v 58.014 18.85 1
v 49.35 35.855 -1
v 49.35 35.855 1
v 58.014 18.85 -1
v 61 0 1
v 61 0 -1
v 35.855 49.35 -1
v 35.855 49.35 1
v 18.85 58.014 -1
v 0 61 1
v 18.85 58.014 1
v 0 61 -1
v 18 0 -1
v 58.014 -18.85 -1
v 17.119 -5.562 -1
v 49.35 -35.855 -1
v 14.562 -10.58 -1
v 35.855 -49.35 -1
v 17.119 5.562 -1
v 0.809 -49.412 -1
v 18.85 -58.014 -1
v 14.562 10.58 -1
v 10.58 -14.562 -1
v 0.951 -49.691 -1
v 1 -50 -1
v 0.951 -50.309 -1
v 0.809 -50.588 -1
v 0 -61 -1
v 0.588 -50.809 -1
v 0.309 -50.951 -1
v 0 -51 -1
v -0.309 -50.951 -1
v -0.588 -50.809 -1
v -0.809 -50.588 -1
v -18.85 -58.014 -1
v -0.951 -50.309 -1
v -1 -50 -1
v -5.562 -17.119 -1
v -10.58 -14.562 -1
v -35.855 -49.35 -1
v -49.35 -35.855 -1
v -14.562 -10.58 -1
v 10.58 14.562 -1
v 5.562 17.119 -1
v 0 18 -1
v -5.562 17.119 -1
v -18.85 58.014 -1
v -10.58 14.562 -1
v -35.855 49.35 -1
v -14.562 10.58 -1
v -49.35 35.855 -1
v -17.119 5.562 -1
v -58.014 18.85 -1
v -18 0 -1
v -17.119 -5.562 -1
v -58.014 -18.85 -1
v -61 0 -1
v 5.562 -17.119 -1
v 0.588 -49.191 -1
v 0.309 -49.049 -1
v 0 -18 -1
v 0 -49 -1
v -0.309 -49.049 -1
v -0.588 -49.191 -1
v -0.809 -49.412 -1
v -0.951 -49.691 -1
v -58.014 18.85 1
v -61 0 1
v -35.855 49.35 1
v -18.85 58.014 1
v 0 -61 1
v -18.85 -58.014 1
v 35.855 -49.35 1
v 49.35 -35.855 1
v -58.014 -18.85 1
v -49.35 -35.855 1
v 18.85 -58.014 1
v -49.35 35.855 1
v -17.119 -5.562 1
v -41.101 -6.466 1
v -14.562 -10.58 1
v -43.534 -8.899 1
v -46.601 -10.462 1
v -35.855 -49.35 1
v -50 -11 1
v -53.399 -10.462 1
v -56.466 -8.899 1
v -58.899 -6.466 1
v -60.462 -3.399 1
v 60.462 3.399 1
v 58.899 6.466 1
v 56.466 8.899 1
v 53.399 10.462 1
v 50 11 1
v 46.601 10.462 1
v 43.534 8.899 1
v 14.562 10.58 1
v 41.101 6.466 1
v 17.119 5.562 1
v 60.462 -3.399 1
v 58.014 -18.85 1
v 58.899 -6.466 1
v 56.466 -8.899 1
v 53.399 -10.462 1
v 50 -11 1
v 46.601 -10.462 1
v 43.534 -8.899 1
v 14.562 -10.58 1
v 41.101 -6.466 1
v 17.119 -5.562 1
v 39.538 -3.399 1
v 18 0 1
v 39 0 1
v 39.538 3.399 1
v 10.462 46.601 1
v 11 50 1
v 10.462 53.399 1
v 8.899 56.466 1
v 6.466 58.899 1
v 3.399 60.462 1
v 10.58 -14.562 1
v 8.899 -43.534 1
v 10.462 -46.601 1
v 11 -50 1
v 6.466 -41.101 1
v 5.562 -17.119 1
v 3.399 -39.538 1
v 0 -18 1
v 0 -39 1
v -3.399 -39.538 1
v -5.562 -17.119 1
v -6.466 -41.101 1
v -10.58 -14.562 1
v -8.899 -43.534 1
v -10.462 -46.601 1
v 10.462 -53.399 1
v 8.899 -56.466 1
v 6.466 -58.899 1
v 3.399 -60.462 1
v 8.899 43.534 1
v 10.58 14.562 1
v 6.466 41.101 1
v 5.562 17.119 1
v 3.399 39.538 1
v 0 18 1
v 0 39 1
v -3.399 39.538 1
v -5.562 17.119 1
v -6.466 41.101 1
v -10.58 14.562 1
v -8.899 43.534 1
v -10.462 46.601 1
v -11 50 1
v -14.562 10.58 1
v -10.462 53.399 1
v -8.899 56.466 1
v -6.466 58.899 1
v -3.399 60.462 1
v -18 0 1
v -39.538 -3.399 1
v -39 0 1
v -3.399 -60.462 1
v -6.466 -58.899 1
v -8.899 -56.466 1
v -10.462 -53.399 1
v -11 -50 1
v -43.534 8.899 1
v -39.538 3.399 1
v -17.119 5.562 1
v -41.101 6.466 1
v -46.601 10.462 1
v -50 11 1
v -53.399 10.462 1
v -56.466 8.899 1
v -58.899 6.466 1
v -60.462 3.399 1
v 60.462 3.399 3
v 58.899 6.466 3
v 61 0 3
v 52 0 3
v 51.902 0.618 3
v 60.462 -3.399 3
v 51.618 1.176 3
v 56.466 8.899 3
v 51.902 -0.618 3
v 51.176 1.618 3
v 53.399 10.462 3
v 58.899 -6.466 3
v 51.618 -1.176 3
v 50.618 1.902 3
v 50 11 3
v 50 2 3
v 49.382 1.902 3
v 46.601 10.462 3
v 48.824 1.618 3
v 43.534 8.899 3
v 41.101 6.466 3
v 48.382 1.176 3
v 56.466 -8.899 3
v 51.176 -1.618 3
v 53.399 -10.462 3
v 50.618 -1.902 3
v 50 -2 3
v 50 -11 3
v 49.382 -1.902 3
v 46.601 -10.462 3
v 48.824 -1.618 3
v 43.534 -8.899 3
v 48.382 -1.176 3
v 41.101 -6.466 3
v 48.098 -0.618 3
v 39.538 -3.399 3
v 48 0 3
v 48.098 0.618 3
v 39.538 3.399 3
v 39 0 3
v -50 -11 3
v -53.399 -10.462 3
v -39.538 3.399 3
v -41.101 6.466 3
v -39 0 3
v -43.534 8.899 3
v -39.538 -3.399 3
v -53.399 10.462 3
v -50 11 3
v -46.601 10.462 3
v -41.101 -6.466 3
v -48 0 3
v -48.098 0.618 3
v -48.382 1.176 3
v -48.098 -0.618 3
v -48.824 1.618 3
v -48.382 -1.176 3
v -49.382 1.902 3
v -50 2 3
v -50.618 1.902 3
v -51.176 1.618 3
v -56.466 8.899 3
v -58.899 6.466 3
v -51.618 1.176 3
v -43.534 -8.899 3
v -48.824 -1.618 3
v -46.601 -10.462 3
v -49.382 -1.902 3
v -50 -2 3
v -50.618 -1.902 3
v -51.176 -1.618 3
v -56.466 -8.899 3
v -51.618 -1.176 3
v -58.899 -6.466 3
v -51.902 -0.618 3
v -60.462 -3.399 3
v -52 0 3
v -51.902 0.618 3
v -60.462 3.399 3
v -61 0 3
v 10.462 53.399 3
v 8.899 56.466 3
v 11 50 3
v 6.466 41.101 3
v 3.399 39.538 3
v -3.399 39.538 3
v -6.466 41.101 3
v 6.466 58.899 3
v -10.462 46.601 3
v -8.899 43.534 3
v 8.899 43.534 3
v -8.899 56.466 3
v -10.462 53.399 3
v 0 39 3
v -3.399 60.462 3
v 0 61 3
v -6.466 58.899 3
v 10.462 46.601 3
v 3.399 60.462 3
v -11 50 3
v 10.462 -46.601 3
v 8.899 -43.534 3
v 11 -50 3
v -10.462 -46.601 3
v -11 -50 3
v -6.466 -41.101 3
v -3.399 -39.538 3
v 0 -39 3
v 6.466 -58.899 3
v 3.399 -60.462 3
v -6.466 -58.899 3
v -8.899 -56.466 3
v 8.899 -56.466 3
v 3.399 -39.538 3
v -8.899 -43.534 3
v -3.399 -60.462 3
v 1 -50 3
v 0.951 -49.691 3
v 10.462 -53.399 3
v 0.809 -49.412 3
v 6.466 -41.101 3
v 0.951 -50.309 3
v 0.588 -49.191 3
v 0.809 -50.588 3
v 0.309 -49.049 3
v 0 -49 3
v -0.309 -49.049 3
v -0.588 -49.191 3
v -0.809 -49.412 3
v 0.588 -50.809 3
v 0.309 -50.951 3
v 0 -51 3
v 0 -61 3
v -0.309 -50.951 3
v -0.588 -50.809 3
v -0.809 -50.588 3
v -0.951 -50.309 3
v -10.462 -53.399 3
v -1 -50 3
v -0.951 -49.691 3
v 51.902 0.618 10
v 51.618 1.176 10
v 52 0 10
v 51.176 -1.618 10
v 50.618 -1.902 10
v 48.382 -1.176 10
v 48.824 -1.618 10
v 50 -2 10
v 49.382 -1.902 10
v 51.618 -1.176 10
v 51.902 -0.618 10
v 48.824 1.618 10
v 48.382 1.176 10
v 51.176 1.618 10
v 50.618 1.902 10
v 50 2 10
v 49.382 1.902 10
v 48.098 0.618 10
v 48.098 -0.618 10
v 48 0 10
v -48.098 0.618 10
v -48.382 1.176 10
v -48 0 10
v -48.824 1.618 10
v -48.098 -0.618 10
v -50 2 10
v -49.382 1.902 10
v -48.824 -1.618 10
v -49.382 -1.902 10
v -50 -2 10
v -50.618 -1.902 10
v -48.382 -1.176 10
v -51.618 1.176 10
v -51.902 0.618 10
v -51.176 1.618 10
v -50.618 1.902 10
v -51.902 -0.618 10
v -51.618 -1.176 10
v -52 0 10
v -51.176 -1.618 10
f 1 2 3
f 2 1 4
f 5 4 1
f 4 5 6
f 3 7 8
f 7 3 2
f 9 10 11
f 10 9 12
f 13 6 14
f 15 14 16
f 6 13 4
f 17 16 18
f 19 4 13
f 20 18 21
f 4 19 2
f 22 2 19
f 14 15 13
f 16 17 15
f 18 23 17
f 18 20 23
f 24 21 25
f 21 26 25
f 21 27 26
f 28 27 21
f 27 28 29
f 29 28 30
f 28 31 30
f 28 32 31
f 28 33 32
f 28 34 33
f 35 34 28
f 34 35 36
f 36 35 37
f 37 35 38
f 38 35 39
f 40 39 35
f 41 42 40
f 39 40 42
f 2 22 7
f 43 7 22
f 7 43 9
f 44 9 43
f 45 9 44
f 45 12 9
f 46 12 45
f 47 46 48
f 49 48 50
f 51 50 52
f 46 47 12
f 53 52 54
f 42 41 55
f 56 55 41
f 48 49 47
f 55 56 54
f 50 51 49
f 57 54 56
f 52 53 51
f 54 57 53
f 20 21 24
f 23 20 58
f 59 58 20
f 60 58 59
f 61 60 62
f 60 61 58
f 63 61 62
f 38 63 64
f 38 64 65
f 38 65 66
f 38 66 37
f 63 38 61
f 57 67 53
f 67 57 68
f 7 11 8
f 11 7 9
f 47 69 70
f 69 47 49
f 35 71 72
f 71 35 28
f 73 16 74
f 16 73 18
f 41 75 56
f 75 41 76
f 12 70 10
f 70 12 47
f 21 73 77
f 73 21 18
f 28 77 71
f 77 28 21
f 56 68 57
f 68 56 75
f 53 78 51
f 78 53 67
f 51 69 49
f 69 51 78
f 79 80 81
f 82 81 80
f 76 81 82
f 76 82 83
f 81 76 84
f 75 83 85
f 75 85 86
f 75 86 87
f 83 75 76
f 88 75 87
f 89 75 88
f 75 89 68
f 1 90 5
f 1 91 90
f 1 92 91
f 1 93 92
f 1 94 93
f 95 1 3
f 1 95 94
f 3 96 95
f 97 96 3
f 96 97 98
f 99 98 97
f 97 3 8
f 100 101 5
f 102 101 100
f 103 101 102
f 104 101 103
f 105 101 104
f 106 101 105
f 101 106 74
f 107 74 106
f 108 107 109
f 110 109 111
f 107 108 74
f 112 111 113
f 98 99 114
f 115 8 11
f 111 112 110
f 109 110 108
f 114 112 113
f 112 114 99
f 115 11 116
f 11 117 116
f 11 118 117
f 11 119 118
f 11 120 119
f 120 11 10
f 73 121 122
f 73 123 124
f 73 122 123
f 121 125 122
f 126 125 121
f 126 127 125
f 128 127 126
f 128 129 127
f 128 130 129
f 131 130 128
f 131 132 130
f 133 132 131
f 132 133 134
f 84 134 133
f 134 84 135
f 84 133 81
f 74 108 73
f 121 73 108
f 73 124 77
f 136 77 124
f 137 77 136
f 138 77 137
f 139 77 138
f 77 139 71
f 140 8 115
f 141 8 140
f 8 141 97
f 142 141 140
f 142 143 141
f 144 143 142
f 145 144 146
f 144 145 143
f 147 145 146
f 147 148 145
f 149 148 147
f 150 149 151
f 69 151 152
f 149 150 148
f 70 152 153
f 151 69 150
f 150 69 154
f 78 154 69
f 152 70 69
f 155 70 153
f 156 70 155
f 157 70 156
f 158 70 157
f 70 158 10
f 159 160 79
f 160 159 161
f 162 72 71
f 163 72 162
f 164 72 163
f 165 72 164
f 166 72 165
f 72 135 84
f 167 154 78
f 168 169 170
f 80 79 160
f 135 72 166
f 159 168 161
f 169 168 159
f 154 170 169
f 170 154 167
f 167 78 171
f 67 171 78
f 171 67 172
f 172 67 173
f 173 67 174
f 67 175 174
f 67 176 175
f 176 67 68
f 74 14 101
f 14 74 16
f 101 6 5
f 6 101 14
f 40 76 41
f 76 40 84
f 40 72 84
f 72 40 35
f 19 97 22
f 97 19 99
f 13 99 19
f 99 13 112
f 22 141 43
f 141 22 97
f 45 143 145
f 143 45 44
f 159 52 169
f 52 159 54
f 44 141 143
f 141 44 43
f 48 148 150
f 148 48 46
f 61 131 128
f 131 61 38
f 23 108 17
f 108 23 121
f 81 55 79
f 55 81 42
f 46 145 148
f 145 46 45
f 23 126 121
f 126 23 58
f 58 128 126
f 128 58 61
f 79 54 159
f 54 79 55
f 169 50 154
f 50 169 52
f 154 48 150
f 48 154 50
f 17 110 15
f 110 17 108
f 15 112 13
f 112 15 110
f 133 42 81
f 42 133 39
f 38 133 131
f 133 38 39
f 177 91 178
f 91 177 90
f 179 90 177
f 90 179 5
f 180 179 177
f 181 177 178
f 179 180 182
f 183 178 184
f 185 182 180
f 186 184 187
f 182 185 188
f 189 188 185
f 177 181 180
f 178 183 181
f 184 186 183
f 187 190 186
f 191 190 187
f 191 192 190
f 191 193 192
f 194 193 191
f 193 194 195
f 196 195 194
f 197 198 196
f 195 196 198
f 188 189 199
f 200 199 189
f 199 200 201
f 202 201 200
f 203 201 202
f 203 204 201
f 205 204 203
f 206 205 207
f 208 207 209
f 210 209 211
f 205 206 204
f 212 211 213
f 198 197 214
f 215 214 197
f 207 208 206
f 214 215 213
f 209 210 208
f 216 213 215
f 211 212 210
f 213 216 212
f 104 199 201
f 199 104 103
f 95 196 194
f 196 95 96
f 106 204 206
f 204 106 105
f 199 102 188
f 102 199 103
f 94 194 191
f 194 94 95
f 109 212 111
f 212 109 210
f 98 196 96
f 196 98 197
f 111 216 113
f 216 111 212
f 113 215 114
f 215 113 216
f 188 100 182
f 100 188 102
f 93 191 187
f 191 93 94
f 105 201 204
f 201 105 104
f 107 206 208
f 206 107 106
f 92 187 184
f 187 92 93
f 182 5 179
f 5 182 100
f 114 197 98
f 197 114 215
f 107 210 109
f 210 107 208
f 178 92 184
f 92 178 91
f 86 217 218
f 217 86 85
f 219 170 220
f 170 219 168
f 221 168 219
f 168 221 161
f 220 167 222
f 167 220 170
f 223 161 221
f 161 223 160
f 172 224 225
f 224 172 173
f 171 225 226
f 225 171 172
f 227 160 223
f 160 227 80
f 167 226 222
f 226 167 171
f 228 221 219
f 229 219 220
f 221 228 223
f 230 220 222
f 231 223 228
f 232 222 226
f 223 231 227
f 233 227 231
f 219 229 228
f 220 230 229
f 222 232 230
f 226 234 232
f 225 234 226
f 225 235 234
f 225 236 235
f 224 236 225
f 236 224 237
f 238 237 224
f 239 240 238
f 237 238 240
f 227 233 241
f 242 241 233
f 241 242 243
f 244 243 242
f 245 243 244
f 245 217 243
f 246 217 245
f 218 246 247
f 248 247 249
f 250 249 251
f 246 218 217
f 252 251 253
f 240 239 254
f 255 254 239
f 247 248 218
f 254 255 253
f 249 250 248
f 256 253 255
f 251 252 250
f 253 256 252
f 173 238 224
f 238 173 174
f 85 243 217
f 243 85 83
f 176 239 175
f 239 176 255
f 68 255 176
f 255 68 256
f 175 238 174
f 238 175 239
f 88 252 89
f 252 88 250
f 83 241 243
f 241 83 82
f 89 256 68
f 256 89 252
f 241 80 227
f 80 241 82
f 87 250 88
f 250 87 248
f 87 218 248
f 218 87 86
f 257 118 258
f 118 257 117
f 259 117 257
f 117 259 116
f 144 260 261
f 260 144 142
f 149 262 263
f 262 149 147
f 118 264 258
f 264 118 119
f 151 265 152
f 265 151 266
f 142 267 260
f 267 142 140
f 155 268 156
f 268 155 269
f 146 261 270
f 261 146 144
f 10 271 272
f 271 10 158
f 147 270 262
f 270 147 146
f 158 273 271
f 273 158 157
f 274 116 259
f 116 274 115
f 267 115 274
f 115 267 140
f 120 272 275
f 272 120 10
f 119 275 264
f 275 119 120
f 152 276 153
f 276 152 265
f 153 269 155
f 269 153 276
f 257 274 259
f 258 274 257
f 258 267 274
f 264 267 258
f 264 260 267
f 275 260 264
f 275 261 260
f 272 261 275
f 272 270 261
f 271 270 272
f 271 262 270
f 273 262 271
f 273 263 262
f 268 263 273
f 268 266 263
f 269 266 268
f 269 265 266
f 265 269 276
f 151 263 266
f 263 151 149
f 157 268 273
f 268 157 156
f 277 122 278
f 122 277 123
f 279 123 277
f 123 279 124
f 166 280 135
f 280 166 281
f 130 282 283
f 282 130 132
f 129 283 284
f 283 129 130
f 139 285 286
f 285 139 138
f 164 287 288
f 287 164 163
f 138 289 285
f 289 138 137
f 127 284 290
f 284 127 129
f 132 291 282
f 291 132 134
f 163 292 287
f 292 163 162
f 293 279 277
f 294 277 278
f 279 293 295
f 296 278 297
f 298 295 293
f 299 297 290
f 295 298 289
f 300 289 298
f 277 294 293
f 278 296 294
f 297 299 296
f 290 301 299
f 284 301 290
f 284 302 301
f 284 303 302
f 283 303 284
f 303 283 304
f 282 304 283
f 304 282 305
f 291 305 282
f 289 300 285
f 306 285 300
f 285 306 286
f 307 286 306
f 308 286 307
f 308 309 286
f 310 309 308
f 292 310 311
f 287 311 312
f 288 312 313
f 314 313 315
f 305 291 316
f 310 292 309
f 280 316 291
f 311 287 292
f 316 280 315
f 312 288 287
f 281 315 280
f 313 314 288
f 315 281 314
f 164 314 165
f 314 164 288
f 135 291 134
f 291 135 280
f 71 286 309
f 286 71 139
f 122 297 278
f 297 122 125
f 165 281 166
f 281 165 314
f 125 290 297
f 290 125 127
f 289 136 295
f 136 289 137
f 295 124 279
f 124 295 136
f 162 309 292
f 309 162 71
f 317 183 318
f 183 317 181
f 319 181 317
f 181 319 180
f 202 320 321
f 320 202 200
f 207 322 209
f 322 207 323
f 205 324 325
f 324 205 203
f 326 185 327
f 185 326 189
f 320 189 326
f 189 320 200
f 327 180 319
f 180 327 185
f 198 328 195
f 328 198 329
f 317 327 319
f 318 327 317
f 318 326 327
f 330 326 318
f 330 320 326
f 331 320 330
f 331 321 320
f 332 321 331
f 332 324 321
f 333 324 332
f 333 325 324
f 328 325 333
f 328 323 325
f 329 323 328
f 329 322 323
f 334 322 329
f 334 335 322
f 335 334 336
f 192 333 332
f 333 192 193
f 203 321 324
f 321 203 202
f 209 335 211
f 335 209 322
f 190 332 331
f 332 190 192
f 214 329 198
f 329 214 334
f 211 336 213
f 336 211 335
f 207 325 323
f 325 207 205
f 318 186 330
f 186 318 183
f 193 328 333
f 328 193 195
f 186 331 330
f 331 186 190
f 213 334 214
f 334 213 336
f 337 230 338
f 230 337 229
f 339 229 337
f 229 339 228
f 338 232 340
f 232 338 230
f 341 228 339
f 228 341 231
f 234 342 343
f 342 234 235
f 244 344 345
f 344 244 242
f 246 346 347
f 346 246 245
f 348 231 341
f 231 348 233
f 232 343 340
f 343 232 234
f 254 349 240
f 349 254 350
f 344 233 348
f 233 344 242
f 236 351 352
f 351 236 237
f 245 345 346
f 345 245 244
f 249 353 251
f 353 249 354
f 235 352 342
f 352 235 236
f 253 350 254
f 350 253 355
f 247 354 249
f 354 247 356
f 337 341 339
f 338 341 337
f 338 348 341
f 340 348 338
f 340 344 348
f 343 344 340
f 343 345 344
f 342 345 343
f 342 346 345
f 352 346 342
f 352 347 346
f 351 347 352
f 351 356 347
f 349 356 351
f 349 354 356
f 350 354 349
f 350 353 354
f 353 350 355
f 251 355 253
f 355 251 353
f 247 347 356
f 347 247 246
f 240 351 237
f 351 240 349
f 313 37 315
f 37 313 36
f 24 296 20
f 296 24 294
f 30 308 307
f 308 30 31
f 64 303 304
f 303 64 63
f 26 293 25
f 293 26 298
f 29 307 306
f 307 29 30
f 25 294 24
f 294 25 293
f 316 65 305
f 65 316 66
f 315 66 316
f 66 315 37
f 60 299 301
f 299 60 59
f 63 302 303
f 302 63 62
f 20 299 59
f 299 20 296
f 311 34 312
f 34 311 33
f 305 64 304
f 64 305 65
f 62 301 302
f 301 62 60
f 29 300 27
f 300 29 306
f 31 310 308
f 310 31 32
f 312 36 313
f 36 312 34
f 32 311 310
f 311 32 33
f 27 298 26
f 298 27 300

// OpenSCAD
// Overall size
height = 2;
outerDiameter = 61; // 122 mm
innerCutoutDiameter = 18; // 36mm
$fn = 20;

module LooRoleBase() {
 
	difference() {
		union() 
		{
			cylinder(height,outerDiameter,outerDiameter,true);
		}	
		
		union() 
		{
			cylinder(height+1,innerCutoutDiameter,innerCutoutDiameter,true);
		}
	}
}

// Leave a small hole in one of the pads so that
// a mark can be made on the base to locate where the 
// sensor should be placed.
module AddSensorLocationHole() {
	translate([0,-50,2])  {
		cylinder(10,1,1,true);
	}
}

module AddPad(x, y, height) {
 translate([x,y,2])  {
	cylinder(height,11,11,true);
 }
}

module AddPads() {

		union() 
		{
			AddPad(50,0,2);
			AddPad(-50,0,2);
			AddPad(0,50,2);
			AddPad(0,-50,2);
		}	
}

module AddPin(x, y) {
 translate([x,y,5])  {
	cylinder(10,2,2,true);
 }
}

// Extend 2 of the pads with small pins to allow the 
// plate to be located without spinning
// whist also allowing it to be rotated 180°
// So that the sensor location hold can be placed
// off the sensor once located.
module AddPins() {
		union() 
		{
			AddPin(50,0);
			AddPin(-50,0);
		}	
}

module BuildTop() {

	difference() {
		union() {
			LooRoleBase();
			AddPads();
			AddPins();
		}
		union() {
			AddSensorLocationHole();
		}
	}
}

BuildTop();
